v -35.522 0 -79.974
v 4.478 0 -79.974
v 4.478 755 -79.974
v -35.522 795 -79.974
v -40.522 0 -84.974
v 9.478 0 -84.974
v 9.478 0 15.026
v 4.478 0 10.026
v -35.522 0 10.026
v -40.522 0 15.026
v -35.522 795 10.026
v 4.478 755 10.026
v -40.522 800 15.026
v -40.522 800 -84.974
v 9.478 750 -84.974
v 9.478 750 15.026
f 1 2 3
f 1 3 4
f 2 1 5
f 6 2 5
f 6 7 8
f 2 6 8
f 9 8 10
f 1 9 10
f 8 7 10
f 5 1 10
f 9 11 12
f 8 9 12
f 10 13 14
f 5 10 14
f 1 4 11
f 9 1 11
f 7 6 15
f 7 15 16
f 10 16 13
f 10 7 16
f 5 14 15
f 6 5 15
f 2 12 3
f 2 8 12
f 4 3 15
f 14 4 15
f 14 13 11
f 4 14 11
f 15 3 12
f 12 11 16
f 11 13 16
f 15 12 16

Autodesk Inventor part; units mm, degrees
ref_plane "YZ Plane" through (0, 0, 0) normal (1, 0, 0) x (0, 1, 0)
ref_plane "XZ Plane" through (0, 0, 0) normal (0, 1, 0) x (-1, 0, 0)
ref_plane "XY Plane" through (0, 0, 0) normal (0, 0, 1) x (1, 0, 0)
sketch "Sketch1" plane through (0, 0, 0) normal (0, 1, 0) x (-1, 0, 0)
  line L0 (-9.4777, 15.0257) -> (40.5223, 15.0257)
  line L1 (40.5223, 15.0257) -> (40.5223, -84.9743)
  line L2 (40.5223, -84.9743) -> (-9.4777, -84.9743)
  line L3 (-9.4777, -84.9743) -> (-9.4777, 15.0257)
  line L4 (35.5223, 10.0257) -> (-4.4777, 10.0257)
  line L5 (-4.4777, 10.0257) -> (-4.4777, -79.9743)
  line L6 (-4.4777, -79.9743) -> (35.5223, -79.9743)
  line L7 (35.5223, -79.9743) -> (35.5223, 10.0257)
  point P0 (0, 0)
  dimension "d0" = 50
  dimension "d1" = 100
  dimension "d2" = 5
  dimension "d3" = 90
  dimension "d4" = 5
  dimension "d5" = 40
extrude "Extrusion1" add sketch "Sketch1" along normal blind 800
sketch "Sketch3" plane through (-40.5223, 0, 15.0257) normal (0, 0, 1) x (1, 0, 0)
  line L0 (0, 0) -> (0, 800) projected
  line L1 (0, 800) -> (50, 750)
  line L2 (0, 800) -> (70.7107, 800) construction
  line L3 (50, 800) -> (0, 800) projected
  line L4 (0, 800) -> (50, 800)
  line L5 (50, 800) -> (50, 750)
  line L6 (50, 0) -> (50, 800) projected
  point P0 (40.5223, 0)
  dimension "d8" = 45
extrude "Extrusion2" cut sketch "Sketch3" against normal blind 800
properties part number "PerfilV1"
